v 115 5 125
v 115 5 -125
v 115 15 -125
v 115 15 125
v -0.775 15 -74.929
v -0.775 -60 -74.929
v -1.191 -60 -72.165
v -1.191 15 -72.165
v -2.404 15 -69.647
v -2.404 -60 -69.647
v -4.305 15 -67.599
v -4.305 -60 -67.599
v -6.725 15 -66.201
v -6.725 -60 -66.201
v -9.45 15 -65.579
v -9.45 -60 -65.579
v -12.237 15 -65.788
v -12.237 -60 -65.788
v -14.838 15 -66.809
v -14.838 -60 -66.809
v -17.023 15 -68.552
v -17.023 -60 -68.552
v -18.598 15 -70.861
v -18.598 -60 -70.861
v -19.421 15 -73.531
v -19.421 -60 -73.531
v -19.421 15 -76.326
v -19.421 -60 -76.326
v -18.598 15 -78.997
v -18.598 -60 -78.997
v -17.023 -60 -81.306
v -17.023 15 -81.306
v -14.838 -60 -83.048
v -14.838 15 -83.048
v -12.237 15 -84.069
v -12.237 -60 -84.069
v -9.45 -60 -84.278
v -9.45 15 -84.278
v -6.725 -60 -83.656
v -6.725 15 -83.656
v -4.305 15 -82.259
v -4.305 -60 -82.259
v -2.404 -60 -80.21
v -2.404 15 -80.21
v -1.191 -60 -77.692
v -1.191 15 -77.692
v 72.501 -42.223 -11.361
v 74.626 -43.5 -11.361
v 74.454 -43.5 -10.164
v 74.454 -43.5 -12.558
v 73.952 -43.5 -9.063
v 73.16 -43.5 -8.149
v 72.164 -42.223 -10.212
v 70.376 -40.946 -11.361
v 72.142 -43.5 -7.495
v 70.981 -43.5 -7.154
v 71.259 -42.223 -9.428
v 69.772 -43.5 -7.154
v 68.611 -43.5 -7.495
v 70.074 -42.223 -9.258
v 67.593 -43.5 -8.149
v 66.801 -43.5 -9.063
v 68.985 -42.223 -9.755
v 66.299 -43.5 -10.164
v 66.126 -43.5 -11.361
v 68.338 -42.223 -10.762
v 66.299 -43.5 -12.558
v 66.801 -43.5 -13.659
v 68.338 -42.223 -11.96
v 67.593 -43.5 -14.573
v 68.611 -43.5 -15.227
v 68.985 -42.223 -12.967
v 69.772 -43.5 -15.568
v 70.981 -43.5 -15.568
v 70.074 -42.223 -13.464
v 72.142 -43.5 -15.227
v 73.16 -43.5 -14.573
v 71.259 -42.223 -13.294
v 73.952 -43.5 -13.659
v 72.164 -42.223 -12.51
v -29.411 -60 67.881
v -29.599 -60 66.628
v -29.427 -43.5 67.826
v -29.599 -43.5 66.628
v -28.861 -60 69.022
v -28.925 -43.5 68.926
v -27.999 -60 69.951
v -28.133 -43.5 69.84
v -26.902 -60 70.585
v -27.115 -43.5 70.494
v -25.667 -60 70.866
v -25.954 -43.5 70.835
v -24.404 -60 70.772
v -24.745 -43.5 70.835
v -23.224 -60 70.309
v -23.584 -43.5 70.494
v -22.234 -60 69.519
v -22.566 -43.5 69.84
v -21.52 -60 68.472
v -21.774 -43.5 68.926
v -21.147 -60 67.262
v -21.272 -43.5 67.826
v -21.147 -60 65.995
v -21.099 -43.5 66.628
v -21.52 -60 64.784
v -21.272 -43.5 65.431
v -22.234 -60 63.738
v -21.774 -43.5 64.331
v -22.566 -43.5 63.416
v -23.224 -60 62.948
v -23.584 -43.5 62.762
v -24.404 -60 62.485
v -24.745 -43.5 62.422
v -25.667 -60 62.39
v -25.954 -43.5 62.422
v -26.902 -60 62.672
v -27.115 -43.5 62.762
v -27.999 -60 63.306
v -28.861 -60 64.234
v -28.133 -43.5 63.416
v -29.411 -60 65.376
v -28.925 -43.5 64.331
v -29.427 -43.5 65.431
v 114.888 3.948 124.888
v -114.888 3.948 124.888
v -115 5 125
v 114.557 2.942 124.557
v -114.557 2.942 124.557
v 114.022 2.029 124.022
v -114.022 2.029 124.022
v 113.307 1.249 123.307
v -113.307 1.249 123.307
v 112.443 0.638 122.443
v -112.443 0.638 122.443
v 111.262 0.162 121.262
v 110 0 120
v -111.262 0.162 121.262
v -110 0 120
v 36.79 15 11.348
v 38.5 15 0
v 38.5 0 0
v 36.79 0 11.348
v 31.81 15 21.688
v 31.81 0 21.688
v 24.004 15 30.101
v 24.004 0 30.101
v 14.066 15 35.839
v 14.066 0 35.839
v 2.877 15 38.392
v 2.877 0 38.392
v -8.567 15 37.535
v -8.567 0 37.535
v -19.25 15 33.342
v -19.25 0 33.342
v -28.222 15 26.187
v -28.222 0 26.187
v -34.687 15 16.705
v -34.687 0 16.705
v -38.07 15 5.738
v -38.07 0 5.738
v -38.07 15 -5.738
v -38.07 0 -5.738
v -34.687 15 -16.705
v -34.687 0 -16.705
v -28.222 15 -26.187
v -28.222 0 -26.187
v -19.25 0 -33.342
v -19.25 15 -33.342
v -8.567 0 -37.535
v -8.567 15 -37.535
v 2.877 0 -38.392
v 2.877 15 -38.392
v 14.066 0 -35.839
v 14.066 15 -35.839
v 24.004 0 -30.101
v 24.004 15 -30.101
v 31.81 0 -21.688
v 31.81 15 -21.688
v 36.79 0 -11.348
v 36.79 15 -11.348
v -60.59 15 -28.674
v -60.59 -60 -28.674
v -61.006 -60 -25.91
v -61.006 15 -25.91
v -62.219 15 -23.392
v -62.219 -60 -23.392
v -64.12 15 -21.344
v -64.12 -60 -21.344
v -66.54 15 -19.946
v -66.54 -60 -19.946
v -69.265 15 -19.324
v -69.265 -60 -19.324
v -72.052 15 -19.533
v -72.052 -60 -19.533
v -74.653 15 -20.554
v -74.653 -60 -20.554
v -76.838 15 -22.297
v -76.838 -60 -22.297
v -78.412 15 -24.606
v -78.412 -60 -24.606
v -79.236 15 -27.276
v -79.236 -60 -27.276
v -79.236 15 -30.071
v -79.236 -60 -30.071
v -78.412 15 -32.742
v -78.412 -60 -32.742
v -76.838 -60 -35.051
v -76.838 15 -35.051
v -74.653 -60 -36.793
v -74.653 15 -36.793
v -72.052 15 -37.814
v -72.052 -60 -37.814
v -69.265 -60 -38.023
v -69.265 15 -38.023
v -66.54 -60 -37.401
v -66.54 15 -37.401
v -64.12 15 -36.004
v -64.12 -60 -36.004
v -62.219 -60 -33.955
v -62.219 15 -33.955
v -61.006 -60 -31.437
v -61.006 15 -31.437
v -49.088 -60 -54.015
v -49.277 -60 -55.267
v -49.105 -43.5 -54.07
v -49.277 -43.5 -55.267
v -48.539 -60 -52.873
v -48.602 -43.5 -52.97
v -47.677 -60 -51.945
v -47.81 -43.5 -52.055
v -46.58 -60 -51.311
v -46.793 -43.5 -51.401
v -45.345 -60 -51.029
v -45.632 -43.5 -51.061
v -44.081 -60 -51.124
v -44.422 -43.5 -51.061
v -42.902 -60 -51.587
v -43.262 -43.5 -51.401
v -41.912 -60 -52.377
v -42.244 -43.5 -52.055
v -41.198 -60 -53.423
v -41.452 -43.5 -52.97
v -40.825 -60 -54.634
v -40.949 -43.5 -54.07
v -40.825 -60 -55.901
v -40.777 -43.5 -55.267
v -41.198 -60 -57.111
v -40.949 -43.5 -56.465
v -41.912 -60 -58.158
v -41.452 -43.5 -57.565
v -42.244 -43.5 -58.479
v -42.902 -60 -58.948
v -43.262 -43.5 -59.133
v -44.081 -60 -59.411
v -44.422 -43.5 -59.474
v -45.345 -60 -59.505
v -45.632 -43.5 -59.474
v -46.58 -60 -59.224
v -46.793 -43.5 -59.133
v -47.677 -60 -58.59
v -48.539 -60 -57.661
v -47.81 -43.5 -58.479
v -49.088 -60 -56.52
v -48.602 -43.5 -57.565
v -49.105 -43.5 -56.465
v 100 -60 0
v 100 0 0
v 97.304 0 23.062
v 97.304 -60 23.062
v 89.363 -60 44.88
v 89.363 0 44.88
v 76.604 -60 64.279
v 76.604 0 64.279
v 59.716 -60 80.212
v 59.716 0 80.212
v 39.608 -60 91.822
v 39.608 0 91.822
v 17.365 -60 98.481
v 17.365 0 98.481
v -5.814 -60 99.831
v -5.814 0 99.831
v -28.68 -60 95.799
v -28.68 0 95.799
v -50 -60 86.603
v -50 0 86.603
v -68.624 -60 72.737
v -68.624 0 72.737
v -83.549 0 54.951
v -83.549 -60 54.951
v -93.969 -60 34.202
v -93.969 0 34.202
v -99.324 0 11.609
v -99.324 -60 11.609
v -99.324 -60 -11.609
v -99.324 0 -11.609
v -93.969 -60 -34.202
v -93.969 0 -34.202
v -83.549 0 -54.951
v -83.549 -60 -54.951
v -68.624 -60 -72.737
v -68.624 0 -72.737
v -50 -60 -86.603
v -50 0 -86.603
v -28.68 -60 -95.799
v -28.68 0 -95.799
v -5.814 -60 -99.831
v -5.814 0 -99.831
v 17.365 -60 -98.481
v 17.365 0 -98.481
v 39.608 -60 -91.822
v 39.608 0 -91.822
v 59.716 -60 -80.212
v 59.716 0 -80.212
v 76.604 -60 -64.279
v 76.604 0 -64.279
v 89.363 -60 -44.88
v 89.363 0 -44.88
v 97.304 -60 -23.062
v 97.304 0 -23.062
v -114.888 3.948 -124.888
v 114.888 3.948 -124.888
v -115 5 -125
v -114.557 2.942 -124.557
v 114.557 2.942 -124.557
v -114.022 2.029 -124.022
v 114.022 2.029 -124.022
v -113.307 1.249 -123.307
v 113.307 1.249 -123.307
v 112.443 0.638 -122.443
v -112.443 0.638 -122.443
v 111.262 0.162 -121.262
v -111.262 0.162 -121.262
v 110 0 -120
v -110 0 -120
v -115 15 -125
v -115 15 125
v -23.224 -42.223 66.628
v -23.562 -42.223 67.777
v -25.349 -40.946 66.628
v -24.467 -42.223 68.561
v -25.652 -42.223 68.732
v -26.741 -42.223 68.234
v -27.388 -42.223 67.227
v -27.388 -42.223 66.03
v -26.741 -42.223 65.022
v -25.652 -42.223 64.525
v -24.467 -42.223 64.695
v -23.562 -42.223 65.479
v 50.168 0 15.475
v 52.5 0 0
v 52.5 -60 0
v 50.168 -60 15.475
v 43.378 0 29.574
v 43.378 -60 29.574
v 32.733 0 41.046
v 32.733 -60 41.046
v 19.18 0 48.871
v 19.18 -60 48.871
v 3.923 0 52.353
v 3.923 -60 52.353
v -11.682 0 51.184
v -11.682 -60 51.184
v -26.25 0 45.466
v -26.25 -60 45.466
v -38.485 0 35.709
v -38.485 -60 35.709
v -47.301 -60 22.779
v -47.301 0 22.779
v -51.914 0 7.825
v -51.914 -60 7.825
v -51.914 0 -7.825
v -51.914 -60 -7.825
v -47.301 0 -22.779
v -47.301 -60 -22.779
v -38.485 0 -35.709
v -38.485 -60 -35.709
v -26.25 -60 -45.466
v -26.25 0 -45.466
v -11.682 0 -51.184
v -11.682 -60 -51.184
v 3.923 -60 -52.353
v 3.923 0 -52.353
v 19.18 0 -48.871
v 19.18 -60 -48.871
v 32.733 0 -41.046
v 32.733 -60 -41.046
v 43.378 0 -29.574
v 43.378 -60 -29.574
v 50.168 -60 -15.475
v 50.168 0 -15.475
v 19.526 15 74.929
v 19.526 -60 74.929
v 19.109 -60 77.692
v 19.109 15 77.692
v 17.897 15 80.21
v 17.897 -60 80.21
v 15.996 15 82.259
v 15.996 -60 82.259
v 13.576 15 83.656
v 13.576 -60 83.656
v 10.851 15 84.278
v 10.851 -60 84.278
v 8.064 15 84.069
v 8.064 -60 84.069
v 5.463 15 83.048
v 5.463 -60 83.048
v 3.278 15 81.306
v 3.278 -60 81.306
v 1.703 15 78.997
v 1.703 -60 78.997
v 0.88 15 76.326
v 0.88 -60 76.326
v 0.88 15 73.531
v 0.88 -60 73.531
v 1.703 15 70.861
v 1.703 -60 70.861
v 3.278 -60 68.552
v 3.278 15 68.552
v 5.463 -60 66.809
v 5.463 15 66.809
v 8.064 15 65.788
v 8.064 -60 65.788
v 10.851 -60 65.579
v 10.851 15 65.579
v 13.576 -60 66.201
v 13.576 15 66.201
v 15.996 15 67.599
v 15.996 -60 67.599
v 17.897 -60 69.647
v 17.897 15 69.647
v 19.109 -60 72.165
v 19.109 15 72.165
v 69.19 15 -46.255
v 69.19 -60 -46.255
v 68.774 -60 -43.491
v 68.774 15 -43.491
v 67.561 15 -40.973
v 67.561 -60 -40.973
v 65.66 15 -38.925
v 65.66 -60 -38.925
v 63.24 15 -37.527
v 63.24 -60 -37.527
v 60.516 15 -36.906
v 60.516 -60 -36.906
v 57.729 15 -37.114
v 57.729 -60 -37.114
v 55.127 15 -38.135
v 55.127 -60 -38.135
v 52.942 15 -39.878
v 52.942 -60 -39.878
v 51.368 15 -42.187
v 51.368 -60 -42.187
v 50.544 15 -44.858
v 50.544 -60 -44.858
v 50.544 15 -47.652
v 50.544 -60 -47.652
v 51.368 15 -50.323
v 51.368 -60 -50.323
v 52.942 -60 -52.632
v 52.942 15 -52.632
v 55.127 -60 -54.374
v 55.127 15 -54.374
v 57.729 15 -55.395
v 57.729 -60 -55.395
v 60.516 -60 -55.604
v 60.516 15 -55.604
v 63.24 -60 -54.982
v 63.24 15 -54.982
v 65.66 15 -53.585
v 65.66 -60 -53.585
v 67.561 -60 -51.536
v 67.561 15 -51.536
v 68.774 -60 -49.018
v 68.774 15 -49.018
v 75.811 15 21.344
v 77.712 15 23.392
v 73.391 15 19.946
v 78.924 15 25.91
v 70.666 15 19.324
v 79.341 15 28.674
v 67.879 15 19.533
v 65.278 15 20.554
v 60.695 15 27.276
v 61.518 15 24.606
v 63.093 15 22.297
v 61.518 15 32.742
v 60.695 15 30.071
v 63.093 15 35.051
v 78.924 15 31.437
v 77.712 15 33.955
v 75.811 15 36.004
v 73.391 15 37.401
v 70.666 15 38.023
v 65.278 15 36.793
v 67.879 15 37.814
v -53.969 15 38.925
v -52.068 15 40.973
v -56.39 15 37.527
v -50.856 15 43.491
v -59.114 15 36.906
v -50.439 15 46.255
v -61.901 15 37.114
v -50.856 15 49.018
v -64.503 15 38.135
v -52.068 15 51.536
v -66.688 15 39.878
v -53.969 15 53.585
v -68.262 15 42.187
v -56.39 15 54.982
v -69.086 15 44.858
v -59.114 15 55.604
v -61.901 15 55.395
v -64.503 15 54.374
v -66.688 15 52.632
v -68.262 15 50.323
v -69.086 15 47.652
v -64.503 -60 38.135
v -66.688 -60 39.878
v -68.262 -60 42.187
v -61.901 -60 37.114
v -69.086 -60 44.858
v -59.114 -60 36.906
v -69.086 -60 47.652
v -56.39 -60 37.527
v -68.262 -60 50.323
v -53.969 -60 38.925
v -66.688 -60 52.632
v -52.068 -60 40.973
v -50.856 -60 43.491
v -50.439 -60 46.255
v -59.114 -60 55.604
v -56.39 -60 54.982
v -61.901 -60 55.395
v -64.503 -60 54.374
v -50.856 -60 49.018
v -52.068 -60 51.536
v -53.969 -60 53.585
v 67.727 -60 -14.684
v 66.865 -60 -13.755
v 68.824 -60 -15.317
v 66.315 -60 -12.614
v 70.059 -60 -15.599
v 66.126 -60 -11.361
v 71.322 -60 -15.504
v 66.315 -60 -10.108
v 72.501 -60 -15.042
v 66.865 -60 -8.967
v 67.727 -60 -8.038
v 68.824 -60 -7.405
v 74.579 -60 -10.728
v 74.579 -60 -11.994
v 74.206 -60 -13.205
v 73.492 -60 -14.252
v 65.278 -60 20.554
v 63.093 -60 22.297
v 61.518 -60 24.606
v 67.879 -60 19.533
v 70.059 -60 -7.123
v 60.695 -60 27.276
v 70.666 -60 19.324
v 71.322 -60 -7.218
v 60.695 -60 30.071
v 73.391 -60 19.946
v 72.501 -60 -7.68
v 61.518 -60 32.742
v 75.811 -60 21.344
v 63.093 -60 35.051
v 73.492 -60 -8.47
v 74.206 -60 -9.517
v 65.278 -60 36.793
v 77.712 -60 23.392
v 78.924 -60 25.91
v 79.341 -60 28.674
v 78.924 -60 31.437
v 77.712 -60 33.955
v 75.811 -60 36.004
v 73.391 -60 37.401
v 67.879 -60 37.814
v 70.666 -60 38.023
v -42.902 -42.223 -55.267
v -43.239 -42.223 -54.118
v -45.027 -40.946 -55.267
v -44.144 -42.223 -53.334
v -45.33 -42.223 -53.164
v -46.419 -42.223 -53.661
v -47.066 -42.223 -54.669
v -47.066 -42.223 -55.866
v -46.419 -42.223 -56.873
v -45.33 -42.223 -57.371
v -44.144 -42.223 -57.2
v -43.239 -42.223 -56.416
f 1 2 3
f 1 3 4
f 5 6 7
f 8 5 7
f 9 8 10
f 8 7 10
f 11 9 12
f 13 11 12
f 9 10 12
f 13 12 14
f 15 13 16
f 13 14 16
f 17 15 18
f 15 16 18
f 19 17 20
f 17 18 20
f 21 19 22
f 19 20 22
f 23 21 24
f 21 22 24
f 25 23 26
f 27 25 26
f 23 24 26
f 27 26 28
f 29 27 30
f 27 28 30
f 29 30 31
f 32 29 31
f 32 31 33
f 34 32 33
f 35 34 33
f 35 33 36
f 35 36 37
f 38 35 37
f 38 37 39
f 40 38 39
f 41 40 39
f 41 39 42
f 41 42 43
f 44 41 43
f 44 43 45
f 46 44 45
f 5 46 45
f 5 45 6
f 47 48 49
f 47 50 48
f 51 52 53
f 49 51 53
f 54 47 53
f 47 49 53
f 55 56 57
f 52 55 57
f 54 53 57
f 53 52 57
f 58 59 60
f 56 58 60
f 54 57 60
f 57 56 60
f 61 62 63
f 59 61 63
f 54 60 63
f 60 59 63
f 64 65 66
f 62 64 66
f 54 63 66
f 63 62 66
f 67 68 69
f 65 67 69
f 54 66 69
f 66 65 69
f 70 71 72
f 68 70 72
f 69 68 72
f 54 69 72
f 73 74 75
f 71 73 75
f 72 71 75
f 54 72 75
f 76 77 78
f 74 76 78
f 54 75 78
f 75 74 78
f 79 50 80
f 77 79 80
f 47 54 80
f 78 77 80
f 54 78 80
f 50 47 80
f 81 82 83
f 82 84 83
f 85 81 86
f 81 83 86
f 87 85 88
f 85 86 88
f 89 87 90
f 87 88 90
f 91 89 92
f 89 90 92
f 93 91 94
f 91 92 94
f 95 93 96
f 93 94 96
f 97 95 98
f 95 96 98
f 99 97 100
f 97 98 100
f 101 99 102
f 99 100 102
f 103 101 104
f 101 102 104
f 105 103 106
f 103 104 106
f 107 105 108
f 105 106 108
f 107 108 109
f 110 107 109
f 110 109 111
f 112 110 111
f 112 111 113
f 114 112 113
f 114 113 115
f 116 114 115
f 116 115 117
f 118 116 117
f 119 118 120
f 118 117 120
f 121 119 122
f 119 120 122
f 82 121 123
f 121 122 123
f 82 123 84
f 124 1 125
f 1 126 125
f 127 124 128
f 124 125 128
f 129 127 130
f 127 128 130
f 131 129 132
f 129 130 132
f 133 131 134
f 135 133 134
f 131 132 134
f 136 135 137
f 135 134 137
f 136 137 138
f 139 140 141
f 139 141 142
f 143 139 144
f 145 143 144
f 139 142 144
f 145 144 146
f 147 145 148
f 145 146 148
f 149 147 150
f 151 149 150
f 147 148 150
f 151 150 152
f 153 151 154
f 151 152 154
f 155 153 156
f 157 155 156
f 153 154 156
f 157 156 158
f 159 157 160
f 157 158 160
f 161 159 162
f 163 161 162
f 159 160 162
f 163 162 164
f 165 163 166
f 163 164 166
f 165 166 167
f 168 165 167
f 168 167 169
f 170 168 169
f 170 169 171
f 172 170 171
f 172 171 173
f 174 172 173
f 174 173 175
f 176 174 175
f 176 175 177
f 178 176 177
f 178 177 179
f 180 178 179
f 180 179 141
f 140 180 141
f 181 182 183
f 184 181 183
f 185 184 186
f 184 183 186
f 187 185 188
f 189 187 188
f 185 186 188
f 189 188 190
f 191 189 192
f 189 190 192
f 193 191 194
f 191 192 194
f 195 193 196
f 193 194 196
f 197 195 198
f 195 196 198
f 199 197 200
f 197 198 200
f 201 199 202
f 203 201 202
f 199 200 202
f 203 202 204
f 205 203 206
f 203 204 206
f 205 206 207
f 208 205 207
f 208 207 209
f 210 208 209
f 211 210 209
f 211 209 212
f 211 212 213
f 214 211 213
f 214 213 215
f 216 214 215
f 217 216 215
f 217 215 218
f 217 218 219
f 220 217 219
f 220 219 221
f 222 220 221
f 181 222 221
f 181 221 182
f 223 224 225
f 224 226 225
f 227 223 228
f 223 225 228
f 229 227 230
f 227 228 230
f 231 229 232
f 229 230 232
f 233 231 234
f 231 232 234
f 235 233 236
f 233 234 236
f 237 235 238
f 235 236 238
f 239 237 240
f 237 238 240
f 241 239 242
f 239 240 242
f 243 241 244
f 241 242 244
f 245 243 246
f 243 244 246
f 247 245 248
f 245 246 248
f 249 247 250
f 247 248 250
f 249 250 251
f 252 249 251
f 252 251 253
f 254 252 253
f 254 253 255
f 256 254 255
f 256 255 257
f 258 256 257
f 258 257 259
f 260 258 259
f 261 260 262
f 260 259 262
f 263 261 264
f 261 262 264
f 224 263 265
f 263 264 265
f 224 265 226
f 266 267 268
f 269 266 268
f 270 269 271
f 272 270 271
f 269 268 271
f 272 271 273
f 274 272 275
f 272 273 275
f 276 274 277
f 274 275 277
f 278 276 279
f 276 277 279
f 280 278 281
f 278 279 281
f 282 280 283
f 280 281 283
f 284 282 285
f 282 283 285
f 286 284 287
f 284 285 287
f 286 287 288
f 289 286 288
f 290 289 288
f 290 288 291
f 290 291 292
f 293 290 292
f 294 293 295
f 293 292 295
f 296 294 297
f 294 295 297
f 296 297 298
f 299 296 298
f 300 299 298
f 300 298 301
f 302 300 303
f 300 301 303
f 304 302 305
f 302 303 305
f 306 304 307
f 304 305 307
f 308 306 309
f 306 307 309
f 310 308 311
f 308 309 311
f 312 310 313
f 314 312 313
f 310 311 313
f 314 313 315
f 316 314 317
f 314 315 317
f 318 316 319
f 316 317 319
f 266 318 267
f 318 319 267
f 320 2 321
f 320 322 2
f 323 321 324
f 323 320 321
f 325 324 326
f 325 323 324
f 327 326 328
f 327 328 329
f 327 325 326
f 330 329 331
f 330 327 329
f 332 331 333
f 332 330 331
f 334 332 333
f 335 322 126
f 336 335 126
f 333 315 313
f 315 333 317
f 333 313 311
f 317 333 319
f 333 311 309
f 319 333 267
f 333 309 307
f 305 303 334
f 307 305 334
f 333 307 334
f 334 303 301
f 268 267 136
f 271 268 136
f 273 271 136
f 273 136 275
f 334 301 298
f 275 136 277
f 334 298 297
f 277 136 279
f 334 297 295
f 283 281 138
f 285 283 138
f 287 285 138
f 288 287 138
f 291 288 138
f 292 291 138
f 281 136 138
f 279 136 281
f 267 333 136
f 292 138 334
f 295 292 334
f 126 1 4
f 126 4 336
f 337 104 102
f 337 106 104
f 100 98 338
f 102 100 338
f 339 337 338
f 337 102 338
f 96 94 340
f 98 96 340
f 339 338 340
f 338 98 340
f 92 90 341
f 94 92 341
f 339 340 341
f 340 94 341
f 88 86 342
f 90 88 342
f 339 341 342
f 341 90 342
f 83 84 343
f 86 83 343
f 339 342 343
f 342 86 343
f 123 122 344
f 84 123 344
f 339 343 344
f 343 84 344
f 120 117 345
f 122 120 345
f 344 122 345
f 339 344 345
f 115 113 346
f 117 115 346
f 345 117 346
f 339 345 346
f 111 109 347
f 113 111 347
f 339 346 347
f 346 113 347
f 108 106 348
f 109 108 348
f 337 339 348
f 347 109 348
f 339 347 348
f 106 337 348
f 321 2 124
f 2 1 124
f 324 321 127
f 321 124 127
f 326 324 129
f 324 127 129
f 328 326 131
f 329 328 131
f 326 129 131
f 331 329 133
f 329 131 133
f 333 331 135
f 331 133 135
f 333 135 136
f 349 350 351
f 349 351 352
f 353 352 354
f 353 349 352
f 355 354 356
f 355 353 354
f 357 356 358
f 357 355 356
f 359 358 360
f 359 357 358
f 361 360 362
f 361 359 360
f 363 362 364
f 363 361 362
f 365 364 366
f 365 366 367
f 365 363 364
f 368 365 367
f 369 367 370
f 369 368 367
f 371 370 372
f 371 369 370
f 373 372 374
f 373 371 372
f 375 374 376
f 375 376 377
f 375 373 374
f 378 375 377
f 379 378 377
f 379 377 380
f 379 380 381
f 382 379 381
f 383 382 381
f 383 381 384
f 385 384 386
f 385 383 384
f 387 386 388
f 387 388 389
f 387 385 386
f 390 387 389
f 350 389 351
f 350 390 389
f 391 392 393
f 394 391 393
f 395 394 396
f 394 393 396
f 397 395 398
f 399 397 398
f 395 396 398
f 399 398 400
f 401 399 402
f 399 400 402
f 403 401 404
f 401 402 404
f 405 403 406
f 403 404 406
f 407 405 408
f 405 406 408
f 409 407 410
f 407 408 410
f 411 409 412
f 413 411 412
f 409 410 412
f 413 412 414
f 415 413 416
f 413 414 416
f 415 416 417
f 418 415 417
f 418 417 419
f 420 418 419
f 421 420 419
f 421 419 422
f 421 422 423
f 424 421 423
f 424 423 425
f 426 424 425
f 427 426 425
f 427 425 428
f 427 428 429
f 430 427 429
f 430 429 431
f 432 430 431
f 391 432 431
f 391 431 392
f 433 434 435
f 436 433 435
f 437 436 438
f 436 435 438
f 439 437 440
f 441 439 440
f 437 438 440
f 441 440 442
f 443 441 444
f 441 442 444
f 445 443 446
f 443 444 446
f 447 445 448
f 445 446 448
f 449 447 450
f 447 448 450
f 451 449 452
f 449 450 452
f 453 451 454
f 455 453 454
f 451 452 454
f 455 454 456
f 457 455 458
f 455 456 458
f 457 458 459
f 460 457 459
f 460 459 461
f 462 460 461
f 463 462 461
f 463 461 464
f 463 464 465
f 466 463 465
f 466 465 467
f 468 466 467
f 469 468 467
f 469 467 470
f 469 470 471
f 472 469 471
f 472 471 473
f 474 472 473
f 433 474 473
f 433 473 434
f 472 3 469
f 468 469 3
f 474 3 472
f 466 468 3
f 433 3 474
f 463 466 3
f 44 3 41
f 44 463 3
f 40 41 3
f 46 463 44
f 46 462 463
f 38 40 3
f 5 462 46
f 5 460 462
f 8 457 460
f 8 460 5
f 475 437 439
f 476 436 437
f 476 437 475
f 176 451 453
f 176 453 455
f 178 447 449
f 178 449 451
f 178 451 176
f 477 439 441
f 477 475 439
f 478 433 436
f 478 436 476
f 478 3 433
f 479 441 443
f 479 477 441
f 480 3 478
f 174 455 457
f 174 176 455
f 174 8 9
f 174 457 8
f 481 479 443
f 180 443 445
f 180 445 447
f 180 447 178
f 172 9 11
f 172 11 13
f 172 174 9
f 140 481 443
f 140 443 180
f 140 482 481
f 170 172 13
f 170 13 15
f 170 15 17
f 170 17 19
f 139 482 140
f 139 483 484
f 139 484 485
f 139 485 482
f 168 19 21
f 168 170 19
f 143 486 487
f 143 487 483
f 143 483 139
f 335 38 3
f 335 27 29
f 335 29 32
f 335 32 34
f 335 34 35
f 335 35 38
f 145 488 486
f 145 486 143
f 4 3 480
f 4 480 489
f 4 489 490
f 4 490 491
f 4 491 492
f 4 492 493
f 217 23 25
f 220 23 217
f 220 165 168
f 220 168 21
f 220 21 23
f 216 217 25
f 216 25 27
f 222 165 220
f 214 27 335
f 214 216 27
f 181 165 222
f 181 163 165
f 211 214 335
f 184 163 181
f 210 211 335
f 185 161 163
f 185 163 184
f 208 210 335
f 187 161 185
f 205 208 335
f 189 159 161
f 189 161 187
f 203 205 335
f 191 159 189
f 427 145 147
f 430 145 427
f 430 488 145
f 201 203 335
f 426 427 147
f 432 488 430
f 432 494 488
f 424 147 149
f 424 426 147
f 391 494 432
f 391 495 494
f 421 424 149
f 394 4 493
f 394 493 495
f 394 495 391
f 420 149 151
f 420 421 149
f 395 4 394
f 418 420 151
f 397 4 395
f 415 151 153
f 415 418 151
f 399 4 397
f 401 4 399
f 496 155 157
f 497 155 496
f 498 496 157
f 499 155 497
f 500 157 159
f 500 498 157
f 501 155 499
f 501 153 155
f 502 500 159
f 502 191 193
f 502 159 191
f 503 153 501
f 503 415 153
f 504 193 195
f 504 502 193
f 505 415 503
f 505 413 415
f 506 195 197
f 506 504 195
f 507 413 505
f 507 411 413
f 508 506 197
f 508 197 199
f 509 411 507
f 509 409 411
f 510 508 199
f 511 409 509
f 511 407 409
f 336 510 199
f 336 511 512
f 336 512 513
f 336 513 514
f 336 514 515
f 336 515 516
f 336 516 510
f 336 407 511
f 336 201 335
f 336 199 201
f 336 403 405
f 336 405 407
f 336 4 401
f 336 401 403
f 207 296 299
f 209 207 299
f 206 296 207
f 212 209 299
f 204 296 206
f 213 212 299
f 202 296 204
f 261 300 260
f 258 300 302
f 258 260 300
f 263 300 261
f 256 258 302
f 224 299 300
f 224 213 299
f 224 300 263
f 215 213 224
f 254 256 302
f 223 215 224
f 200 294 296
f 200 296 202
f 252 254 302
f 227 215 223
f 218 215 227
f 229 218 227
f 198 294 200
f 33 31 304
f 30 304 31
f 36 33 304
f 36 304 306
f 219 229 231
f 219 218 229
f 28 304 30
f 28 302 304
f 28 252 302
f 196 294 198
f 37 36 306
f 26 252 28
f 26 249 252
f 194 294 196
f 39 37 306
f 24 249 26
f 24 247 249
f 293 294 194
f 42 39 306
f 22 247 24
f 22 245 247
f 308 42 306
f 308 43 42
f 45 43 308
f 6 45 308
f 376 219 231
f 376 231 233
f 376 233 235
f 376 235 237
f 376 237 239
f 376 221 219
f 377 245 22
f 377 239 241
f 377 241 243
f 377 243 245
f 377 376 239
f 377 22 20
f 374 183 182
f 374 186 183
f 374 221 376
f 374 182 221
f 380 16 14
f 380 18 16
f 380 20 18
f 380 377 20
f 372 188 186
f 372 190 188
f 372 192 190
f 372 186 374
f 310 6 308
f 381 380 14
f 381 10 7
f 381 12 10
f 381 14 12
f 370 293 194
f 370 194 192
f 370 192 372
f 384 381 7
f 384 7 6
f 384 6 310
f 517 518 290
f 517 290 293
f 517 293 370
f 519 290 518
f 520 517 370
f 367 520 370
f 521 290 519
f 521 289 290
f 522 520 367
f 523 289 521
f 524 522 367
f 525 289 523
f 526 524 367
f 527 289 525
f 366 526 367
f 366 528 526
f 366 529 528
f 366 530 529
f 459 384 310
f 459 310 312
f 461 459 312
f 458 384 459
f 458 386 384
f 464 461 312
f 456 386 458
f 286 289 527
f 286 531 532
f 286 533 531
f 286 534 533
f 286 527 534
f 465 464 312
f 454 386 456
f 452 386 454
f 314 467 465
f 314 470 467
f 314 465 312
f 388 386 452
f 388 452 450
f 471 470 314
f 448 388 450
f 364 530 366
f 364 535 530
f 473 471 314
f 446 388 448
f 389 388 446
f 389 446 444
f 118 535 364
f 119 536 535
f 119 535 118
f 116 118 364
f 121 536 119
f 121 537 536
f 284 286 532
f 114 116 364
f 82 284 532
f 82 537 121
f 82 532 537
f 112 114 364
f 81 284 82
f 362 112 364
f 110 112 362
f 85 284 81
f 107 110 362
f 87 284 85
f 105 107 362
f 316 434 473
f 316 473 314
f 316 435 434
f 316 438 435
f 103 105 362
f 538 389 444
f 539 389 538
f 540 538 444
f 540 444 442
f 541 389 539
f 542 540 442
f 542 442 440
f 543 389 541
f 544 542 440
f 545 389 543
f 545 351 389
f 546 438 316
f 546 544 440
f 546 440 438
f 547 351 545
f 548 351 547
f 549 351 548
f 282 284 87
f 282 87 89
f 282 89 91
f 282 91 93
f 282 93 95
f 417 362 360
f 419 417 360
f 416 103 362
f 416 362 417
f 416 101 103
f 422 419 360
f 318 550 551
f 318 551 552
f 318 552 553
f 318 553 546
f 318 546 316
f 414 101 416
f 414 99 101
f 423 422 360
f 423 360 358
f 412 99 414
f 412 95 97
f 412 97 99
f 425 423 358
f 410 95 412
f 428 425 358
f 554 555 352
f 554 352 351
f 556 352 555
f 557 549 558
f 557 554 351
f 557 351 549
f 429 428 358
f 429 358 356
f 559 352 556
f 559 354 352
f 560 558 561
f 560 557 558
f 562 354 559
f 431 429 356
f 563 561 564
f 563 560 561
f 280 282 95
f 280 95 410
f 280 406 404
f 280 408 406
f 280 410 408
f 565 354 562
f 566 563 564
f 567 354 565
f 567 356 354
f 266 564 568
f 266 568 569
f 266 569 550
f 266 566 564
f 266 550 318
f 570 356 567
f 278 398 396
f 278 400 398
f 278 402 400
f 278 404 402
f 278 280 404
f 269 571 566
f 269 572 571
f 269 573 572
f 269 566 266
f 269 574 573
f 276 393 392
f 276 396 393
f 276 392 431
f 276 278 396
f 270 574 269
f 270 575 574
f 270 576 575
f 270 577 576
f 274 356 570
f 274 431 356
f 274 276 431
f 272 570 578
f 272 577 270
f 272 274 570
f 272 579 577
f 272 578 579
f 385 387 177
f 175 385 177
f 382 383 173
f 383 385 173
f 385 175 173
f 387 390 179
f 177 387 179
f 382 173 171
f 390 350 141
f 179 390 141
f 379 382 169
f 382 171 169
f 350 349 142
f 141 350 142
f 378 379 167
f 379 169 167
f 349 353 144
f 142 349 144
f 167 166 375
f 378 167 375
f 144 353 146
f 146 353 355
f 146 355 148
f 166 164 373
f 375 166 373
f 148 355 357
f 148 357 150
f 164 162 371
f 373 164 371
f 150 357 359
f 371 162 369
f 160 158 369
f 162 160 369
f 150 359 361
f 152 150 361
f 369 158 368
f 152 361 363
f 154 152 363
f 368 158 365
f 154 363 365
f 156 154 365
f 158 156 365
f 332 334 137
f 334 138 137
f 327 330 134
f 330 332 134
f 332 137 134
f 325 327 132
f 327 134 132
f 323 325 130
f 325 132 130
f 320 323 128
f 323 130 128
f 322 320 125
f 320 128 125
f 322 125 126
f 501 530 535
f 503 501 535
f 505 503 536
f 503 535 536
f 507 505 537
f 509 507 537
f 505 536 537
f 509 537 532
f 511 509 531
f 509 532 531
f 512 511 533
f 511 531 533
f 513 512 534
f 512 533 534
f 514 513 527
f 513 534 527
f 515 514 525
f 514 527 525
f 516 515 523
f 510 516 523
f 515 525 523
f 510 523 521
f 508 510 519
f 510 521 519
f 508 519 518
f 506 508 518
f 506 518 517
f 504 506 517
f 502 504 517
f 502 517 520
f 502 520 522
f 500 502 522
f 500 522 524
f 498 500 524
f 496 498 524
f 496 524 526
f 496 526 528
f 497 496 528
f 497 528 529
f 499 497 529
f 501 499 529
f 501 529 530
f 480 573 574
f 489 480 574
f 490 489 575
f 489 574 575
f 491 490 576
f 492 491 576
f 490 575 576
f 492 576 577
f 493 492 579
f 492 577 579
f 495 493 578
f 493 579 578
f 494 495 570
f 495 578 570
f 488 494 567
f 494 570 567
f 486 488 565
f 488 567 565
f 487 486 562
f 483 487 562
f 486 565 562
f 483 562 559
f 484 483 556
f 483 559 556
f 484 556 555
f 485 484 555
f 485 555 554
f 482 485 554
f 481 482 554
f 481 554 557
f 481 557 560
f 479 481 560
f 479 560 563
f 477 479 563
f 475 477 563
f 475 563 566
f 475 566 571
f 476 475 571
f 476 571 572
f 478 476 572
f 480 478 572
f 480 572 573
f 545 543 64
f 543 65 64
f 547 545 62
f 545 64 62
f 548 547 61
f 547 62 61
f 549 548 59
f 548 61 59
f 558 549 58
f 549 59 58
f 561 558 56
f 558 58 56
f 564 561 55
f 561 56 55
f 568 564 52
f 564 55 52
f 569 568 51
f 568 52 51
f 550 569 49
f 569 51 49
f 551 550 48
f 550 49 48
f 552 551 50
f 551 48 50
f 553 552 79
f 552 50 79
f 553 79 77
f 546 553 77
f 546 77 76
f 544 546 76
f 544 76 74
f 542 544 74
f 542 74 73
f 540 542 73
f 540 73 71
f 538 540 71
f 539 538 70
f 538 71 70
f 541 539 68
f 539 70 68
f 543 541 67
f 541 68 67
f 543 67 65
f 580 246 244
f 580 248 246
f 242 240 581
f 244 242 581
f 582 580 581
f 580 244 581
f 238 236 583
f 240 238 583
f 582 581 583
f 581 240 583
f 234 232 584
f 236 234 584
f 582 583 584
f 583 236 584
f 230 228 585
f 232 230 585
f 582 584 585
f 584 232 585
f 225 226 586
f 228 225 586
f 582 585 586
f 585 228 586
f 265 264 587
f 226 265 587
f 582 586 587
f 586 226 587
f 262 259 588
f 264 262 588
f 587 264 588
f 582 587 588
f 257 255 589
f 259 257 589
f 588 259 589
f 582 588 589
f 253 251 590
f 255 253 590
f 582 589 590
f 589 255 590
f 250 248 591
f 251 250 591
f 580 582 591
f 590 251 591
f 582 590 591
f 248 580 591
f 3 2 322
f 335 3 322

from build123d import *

# Parameters (mm, degrees)
F0_R     = 100
F0_R_2   = 52.5
F1_DEPTH = 60
F3_W     = 230
F3_H     = 250
F4_DEPTH = 15
F2_R     = 9.3755397544
F5_DEPTH = 75.001
F6_R     = 38.5
F7_DEPTH = 15.001
F9_D     = 8.5
F9_DEPTH = 16.5
F9_TIP   = 2.5536576309
F10_R    = 5


with BuildPart() as f1:
    # F0 (on Front) → F1 (new body)
    with BuildSketch(Plane.XZ):
        Circle(F0_R)
        Circle(F0_R_2, mode=Mode.SUBTRACT)
    extrude(amount=F1_DEPTH)

    # F3 (on face) → F4 (join)
    with BuildSketch(Plane(origin=(0, 0, 0), x_dir=(-1, 0, 0), z_dir=(0, 1, 0))):
        Rectangle(F3_W, F3_H)
    extrude(amount=F4_DEPTH)

    # F2 (on face) → F5 (cut, through all)
    with BuildSketch(Plane.XZ.offset(60)):
        with Locations((-59.8148740828, 46.2548695505)):
            Circle(F2_R)
        with Locations((-69.9653291208, -28.6737657046)):
            Circle(F2_R)
        with Locations((-10.150455038, -74.9286352551)):
            Circle(F2_R)
        with Locations((59.8148740828, -46.2548695505)):
            Circle(F2_R)
        with Locations((69.9653291208, 28.6737657046)):
            Circle(F2_R)
        with Locations((10.150455038, 74.9286352551)):
            Circle(F2_R)
    extrude(amount=-F5_DEPTH, mode=Mode.SUBTRACT)

    # F6 (on face) → F7 (cut, through all)
    with BuildSketch(Plane.XZ):
        Circle(F6_R)
    extrude(amount=-F7_DEPTH, mode=Mode.SUBTRACT)

    # F9
    with Locations(Plane.XZ.offset(60)):
        with Locations((-45.0271219015, -55.2673339844), (-25.3493542792, 66.6282984182), (70.3764761807, -11.3609644338)):
            Hole(F9_D / 2, depth=F9_DEPTH)
            with Locations((0, 0, -(F9_DEPTH + F9_TIP / 2))):  # 118° drill point
                Cone(0, F9_D / 2, F9_TIP, mode=Mode.SUBTRACT)

    # F10
    f10_edges = [f1.edges().sort_by_distance(p)[0] for p in [
        (0, 0, 125),
        (115, 0, 0),
        (0, 0, -125),
        (-115, 0, 0),
    ]]
    fillet(f10_edges, radius=F10_R)


solid = f1.part
